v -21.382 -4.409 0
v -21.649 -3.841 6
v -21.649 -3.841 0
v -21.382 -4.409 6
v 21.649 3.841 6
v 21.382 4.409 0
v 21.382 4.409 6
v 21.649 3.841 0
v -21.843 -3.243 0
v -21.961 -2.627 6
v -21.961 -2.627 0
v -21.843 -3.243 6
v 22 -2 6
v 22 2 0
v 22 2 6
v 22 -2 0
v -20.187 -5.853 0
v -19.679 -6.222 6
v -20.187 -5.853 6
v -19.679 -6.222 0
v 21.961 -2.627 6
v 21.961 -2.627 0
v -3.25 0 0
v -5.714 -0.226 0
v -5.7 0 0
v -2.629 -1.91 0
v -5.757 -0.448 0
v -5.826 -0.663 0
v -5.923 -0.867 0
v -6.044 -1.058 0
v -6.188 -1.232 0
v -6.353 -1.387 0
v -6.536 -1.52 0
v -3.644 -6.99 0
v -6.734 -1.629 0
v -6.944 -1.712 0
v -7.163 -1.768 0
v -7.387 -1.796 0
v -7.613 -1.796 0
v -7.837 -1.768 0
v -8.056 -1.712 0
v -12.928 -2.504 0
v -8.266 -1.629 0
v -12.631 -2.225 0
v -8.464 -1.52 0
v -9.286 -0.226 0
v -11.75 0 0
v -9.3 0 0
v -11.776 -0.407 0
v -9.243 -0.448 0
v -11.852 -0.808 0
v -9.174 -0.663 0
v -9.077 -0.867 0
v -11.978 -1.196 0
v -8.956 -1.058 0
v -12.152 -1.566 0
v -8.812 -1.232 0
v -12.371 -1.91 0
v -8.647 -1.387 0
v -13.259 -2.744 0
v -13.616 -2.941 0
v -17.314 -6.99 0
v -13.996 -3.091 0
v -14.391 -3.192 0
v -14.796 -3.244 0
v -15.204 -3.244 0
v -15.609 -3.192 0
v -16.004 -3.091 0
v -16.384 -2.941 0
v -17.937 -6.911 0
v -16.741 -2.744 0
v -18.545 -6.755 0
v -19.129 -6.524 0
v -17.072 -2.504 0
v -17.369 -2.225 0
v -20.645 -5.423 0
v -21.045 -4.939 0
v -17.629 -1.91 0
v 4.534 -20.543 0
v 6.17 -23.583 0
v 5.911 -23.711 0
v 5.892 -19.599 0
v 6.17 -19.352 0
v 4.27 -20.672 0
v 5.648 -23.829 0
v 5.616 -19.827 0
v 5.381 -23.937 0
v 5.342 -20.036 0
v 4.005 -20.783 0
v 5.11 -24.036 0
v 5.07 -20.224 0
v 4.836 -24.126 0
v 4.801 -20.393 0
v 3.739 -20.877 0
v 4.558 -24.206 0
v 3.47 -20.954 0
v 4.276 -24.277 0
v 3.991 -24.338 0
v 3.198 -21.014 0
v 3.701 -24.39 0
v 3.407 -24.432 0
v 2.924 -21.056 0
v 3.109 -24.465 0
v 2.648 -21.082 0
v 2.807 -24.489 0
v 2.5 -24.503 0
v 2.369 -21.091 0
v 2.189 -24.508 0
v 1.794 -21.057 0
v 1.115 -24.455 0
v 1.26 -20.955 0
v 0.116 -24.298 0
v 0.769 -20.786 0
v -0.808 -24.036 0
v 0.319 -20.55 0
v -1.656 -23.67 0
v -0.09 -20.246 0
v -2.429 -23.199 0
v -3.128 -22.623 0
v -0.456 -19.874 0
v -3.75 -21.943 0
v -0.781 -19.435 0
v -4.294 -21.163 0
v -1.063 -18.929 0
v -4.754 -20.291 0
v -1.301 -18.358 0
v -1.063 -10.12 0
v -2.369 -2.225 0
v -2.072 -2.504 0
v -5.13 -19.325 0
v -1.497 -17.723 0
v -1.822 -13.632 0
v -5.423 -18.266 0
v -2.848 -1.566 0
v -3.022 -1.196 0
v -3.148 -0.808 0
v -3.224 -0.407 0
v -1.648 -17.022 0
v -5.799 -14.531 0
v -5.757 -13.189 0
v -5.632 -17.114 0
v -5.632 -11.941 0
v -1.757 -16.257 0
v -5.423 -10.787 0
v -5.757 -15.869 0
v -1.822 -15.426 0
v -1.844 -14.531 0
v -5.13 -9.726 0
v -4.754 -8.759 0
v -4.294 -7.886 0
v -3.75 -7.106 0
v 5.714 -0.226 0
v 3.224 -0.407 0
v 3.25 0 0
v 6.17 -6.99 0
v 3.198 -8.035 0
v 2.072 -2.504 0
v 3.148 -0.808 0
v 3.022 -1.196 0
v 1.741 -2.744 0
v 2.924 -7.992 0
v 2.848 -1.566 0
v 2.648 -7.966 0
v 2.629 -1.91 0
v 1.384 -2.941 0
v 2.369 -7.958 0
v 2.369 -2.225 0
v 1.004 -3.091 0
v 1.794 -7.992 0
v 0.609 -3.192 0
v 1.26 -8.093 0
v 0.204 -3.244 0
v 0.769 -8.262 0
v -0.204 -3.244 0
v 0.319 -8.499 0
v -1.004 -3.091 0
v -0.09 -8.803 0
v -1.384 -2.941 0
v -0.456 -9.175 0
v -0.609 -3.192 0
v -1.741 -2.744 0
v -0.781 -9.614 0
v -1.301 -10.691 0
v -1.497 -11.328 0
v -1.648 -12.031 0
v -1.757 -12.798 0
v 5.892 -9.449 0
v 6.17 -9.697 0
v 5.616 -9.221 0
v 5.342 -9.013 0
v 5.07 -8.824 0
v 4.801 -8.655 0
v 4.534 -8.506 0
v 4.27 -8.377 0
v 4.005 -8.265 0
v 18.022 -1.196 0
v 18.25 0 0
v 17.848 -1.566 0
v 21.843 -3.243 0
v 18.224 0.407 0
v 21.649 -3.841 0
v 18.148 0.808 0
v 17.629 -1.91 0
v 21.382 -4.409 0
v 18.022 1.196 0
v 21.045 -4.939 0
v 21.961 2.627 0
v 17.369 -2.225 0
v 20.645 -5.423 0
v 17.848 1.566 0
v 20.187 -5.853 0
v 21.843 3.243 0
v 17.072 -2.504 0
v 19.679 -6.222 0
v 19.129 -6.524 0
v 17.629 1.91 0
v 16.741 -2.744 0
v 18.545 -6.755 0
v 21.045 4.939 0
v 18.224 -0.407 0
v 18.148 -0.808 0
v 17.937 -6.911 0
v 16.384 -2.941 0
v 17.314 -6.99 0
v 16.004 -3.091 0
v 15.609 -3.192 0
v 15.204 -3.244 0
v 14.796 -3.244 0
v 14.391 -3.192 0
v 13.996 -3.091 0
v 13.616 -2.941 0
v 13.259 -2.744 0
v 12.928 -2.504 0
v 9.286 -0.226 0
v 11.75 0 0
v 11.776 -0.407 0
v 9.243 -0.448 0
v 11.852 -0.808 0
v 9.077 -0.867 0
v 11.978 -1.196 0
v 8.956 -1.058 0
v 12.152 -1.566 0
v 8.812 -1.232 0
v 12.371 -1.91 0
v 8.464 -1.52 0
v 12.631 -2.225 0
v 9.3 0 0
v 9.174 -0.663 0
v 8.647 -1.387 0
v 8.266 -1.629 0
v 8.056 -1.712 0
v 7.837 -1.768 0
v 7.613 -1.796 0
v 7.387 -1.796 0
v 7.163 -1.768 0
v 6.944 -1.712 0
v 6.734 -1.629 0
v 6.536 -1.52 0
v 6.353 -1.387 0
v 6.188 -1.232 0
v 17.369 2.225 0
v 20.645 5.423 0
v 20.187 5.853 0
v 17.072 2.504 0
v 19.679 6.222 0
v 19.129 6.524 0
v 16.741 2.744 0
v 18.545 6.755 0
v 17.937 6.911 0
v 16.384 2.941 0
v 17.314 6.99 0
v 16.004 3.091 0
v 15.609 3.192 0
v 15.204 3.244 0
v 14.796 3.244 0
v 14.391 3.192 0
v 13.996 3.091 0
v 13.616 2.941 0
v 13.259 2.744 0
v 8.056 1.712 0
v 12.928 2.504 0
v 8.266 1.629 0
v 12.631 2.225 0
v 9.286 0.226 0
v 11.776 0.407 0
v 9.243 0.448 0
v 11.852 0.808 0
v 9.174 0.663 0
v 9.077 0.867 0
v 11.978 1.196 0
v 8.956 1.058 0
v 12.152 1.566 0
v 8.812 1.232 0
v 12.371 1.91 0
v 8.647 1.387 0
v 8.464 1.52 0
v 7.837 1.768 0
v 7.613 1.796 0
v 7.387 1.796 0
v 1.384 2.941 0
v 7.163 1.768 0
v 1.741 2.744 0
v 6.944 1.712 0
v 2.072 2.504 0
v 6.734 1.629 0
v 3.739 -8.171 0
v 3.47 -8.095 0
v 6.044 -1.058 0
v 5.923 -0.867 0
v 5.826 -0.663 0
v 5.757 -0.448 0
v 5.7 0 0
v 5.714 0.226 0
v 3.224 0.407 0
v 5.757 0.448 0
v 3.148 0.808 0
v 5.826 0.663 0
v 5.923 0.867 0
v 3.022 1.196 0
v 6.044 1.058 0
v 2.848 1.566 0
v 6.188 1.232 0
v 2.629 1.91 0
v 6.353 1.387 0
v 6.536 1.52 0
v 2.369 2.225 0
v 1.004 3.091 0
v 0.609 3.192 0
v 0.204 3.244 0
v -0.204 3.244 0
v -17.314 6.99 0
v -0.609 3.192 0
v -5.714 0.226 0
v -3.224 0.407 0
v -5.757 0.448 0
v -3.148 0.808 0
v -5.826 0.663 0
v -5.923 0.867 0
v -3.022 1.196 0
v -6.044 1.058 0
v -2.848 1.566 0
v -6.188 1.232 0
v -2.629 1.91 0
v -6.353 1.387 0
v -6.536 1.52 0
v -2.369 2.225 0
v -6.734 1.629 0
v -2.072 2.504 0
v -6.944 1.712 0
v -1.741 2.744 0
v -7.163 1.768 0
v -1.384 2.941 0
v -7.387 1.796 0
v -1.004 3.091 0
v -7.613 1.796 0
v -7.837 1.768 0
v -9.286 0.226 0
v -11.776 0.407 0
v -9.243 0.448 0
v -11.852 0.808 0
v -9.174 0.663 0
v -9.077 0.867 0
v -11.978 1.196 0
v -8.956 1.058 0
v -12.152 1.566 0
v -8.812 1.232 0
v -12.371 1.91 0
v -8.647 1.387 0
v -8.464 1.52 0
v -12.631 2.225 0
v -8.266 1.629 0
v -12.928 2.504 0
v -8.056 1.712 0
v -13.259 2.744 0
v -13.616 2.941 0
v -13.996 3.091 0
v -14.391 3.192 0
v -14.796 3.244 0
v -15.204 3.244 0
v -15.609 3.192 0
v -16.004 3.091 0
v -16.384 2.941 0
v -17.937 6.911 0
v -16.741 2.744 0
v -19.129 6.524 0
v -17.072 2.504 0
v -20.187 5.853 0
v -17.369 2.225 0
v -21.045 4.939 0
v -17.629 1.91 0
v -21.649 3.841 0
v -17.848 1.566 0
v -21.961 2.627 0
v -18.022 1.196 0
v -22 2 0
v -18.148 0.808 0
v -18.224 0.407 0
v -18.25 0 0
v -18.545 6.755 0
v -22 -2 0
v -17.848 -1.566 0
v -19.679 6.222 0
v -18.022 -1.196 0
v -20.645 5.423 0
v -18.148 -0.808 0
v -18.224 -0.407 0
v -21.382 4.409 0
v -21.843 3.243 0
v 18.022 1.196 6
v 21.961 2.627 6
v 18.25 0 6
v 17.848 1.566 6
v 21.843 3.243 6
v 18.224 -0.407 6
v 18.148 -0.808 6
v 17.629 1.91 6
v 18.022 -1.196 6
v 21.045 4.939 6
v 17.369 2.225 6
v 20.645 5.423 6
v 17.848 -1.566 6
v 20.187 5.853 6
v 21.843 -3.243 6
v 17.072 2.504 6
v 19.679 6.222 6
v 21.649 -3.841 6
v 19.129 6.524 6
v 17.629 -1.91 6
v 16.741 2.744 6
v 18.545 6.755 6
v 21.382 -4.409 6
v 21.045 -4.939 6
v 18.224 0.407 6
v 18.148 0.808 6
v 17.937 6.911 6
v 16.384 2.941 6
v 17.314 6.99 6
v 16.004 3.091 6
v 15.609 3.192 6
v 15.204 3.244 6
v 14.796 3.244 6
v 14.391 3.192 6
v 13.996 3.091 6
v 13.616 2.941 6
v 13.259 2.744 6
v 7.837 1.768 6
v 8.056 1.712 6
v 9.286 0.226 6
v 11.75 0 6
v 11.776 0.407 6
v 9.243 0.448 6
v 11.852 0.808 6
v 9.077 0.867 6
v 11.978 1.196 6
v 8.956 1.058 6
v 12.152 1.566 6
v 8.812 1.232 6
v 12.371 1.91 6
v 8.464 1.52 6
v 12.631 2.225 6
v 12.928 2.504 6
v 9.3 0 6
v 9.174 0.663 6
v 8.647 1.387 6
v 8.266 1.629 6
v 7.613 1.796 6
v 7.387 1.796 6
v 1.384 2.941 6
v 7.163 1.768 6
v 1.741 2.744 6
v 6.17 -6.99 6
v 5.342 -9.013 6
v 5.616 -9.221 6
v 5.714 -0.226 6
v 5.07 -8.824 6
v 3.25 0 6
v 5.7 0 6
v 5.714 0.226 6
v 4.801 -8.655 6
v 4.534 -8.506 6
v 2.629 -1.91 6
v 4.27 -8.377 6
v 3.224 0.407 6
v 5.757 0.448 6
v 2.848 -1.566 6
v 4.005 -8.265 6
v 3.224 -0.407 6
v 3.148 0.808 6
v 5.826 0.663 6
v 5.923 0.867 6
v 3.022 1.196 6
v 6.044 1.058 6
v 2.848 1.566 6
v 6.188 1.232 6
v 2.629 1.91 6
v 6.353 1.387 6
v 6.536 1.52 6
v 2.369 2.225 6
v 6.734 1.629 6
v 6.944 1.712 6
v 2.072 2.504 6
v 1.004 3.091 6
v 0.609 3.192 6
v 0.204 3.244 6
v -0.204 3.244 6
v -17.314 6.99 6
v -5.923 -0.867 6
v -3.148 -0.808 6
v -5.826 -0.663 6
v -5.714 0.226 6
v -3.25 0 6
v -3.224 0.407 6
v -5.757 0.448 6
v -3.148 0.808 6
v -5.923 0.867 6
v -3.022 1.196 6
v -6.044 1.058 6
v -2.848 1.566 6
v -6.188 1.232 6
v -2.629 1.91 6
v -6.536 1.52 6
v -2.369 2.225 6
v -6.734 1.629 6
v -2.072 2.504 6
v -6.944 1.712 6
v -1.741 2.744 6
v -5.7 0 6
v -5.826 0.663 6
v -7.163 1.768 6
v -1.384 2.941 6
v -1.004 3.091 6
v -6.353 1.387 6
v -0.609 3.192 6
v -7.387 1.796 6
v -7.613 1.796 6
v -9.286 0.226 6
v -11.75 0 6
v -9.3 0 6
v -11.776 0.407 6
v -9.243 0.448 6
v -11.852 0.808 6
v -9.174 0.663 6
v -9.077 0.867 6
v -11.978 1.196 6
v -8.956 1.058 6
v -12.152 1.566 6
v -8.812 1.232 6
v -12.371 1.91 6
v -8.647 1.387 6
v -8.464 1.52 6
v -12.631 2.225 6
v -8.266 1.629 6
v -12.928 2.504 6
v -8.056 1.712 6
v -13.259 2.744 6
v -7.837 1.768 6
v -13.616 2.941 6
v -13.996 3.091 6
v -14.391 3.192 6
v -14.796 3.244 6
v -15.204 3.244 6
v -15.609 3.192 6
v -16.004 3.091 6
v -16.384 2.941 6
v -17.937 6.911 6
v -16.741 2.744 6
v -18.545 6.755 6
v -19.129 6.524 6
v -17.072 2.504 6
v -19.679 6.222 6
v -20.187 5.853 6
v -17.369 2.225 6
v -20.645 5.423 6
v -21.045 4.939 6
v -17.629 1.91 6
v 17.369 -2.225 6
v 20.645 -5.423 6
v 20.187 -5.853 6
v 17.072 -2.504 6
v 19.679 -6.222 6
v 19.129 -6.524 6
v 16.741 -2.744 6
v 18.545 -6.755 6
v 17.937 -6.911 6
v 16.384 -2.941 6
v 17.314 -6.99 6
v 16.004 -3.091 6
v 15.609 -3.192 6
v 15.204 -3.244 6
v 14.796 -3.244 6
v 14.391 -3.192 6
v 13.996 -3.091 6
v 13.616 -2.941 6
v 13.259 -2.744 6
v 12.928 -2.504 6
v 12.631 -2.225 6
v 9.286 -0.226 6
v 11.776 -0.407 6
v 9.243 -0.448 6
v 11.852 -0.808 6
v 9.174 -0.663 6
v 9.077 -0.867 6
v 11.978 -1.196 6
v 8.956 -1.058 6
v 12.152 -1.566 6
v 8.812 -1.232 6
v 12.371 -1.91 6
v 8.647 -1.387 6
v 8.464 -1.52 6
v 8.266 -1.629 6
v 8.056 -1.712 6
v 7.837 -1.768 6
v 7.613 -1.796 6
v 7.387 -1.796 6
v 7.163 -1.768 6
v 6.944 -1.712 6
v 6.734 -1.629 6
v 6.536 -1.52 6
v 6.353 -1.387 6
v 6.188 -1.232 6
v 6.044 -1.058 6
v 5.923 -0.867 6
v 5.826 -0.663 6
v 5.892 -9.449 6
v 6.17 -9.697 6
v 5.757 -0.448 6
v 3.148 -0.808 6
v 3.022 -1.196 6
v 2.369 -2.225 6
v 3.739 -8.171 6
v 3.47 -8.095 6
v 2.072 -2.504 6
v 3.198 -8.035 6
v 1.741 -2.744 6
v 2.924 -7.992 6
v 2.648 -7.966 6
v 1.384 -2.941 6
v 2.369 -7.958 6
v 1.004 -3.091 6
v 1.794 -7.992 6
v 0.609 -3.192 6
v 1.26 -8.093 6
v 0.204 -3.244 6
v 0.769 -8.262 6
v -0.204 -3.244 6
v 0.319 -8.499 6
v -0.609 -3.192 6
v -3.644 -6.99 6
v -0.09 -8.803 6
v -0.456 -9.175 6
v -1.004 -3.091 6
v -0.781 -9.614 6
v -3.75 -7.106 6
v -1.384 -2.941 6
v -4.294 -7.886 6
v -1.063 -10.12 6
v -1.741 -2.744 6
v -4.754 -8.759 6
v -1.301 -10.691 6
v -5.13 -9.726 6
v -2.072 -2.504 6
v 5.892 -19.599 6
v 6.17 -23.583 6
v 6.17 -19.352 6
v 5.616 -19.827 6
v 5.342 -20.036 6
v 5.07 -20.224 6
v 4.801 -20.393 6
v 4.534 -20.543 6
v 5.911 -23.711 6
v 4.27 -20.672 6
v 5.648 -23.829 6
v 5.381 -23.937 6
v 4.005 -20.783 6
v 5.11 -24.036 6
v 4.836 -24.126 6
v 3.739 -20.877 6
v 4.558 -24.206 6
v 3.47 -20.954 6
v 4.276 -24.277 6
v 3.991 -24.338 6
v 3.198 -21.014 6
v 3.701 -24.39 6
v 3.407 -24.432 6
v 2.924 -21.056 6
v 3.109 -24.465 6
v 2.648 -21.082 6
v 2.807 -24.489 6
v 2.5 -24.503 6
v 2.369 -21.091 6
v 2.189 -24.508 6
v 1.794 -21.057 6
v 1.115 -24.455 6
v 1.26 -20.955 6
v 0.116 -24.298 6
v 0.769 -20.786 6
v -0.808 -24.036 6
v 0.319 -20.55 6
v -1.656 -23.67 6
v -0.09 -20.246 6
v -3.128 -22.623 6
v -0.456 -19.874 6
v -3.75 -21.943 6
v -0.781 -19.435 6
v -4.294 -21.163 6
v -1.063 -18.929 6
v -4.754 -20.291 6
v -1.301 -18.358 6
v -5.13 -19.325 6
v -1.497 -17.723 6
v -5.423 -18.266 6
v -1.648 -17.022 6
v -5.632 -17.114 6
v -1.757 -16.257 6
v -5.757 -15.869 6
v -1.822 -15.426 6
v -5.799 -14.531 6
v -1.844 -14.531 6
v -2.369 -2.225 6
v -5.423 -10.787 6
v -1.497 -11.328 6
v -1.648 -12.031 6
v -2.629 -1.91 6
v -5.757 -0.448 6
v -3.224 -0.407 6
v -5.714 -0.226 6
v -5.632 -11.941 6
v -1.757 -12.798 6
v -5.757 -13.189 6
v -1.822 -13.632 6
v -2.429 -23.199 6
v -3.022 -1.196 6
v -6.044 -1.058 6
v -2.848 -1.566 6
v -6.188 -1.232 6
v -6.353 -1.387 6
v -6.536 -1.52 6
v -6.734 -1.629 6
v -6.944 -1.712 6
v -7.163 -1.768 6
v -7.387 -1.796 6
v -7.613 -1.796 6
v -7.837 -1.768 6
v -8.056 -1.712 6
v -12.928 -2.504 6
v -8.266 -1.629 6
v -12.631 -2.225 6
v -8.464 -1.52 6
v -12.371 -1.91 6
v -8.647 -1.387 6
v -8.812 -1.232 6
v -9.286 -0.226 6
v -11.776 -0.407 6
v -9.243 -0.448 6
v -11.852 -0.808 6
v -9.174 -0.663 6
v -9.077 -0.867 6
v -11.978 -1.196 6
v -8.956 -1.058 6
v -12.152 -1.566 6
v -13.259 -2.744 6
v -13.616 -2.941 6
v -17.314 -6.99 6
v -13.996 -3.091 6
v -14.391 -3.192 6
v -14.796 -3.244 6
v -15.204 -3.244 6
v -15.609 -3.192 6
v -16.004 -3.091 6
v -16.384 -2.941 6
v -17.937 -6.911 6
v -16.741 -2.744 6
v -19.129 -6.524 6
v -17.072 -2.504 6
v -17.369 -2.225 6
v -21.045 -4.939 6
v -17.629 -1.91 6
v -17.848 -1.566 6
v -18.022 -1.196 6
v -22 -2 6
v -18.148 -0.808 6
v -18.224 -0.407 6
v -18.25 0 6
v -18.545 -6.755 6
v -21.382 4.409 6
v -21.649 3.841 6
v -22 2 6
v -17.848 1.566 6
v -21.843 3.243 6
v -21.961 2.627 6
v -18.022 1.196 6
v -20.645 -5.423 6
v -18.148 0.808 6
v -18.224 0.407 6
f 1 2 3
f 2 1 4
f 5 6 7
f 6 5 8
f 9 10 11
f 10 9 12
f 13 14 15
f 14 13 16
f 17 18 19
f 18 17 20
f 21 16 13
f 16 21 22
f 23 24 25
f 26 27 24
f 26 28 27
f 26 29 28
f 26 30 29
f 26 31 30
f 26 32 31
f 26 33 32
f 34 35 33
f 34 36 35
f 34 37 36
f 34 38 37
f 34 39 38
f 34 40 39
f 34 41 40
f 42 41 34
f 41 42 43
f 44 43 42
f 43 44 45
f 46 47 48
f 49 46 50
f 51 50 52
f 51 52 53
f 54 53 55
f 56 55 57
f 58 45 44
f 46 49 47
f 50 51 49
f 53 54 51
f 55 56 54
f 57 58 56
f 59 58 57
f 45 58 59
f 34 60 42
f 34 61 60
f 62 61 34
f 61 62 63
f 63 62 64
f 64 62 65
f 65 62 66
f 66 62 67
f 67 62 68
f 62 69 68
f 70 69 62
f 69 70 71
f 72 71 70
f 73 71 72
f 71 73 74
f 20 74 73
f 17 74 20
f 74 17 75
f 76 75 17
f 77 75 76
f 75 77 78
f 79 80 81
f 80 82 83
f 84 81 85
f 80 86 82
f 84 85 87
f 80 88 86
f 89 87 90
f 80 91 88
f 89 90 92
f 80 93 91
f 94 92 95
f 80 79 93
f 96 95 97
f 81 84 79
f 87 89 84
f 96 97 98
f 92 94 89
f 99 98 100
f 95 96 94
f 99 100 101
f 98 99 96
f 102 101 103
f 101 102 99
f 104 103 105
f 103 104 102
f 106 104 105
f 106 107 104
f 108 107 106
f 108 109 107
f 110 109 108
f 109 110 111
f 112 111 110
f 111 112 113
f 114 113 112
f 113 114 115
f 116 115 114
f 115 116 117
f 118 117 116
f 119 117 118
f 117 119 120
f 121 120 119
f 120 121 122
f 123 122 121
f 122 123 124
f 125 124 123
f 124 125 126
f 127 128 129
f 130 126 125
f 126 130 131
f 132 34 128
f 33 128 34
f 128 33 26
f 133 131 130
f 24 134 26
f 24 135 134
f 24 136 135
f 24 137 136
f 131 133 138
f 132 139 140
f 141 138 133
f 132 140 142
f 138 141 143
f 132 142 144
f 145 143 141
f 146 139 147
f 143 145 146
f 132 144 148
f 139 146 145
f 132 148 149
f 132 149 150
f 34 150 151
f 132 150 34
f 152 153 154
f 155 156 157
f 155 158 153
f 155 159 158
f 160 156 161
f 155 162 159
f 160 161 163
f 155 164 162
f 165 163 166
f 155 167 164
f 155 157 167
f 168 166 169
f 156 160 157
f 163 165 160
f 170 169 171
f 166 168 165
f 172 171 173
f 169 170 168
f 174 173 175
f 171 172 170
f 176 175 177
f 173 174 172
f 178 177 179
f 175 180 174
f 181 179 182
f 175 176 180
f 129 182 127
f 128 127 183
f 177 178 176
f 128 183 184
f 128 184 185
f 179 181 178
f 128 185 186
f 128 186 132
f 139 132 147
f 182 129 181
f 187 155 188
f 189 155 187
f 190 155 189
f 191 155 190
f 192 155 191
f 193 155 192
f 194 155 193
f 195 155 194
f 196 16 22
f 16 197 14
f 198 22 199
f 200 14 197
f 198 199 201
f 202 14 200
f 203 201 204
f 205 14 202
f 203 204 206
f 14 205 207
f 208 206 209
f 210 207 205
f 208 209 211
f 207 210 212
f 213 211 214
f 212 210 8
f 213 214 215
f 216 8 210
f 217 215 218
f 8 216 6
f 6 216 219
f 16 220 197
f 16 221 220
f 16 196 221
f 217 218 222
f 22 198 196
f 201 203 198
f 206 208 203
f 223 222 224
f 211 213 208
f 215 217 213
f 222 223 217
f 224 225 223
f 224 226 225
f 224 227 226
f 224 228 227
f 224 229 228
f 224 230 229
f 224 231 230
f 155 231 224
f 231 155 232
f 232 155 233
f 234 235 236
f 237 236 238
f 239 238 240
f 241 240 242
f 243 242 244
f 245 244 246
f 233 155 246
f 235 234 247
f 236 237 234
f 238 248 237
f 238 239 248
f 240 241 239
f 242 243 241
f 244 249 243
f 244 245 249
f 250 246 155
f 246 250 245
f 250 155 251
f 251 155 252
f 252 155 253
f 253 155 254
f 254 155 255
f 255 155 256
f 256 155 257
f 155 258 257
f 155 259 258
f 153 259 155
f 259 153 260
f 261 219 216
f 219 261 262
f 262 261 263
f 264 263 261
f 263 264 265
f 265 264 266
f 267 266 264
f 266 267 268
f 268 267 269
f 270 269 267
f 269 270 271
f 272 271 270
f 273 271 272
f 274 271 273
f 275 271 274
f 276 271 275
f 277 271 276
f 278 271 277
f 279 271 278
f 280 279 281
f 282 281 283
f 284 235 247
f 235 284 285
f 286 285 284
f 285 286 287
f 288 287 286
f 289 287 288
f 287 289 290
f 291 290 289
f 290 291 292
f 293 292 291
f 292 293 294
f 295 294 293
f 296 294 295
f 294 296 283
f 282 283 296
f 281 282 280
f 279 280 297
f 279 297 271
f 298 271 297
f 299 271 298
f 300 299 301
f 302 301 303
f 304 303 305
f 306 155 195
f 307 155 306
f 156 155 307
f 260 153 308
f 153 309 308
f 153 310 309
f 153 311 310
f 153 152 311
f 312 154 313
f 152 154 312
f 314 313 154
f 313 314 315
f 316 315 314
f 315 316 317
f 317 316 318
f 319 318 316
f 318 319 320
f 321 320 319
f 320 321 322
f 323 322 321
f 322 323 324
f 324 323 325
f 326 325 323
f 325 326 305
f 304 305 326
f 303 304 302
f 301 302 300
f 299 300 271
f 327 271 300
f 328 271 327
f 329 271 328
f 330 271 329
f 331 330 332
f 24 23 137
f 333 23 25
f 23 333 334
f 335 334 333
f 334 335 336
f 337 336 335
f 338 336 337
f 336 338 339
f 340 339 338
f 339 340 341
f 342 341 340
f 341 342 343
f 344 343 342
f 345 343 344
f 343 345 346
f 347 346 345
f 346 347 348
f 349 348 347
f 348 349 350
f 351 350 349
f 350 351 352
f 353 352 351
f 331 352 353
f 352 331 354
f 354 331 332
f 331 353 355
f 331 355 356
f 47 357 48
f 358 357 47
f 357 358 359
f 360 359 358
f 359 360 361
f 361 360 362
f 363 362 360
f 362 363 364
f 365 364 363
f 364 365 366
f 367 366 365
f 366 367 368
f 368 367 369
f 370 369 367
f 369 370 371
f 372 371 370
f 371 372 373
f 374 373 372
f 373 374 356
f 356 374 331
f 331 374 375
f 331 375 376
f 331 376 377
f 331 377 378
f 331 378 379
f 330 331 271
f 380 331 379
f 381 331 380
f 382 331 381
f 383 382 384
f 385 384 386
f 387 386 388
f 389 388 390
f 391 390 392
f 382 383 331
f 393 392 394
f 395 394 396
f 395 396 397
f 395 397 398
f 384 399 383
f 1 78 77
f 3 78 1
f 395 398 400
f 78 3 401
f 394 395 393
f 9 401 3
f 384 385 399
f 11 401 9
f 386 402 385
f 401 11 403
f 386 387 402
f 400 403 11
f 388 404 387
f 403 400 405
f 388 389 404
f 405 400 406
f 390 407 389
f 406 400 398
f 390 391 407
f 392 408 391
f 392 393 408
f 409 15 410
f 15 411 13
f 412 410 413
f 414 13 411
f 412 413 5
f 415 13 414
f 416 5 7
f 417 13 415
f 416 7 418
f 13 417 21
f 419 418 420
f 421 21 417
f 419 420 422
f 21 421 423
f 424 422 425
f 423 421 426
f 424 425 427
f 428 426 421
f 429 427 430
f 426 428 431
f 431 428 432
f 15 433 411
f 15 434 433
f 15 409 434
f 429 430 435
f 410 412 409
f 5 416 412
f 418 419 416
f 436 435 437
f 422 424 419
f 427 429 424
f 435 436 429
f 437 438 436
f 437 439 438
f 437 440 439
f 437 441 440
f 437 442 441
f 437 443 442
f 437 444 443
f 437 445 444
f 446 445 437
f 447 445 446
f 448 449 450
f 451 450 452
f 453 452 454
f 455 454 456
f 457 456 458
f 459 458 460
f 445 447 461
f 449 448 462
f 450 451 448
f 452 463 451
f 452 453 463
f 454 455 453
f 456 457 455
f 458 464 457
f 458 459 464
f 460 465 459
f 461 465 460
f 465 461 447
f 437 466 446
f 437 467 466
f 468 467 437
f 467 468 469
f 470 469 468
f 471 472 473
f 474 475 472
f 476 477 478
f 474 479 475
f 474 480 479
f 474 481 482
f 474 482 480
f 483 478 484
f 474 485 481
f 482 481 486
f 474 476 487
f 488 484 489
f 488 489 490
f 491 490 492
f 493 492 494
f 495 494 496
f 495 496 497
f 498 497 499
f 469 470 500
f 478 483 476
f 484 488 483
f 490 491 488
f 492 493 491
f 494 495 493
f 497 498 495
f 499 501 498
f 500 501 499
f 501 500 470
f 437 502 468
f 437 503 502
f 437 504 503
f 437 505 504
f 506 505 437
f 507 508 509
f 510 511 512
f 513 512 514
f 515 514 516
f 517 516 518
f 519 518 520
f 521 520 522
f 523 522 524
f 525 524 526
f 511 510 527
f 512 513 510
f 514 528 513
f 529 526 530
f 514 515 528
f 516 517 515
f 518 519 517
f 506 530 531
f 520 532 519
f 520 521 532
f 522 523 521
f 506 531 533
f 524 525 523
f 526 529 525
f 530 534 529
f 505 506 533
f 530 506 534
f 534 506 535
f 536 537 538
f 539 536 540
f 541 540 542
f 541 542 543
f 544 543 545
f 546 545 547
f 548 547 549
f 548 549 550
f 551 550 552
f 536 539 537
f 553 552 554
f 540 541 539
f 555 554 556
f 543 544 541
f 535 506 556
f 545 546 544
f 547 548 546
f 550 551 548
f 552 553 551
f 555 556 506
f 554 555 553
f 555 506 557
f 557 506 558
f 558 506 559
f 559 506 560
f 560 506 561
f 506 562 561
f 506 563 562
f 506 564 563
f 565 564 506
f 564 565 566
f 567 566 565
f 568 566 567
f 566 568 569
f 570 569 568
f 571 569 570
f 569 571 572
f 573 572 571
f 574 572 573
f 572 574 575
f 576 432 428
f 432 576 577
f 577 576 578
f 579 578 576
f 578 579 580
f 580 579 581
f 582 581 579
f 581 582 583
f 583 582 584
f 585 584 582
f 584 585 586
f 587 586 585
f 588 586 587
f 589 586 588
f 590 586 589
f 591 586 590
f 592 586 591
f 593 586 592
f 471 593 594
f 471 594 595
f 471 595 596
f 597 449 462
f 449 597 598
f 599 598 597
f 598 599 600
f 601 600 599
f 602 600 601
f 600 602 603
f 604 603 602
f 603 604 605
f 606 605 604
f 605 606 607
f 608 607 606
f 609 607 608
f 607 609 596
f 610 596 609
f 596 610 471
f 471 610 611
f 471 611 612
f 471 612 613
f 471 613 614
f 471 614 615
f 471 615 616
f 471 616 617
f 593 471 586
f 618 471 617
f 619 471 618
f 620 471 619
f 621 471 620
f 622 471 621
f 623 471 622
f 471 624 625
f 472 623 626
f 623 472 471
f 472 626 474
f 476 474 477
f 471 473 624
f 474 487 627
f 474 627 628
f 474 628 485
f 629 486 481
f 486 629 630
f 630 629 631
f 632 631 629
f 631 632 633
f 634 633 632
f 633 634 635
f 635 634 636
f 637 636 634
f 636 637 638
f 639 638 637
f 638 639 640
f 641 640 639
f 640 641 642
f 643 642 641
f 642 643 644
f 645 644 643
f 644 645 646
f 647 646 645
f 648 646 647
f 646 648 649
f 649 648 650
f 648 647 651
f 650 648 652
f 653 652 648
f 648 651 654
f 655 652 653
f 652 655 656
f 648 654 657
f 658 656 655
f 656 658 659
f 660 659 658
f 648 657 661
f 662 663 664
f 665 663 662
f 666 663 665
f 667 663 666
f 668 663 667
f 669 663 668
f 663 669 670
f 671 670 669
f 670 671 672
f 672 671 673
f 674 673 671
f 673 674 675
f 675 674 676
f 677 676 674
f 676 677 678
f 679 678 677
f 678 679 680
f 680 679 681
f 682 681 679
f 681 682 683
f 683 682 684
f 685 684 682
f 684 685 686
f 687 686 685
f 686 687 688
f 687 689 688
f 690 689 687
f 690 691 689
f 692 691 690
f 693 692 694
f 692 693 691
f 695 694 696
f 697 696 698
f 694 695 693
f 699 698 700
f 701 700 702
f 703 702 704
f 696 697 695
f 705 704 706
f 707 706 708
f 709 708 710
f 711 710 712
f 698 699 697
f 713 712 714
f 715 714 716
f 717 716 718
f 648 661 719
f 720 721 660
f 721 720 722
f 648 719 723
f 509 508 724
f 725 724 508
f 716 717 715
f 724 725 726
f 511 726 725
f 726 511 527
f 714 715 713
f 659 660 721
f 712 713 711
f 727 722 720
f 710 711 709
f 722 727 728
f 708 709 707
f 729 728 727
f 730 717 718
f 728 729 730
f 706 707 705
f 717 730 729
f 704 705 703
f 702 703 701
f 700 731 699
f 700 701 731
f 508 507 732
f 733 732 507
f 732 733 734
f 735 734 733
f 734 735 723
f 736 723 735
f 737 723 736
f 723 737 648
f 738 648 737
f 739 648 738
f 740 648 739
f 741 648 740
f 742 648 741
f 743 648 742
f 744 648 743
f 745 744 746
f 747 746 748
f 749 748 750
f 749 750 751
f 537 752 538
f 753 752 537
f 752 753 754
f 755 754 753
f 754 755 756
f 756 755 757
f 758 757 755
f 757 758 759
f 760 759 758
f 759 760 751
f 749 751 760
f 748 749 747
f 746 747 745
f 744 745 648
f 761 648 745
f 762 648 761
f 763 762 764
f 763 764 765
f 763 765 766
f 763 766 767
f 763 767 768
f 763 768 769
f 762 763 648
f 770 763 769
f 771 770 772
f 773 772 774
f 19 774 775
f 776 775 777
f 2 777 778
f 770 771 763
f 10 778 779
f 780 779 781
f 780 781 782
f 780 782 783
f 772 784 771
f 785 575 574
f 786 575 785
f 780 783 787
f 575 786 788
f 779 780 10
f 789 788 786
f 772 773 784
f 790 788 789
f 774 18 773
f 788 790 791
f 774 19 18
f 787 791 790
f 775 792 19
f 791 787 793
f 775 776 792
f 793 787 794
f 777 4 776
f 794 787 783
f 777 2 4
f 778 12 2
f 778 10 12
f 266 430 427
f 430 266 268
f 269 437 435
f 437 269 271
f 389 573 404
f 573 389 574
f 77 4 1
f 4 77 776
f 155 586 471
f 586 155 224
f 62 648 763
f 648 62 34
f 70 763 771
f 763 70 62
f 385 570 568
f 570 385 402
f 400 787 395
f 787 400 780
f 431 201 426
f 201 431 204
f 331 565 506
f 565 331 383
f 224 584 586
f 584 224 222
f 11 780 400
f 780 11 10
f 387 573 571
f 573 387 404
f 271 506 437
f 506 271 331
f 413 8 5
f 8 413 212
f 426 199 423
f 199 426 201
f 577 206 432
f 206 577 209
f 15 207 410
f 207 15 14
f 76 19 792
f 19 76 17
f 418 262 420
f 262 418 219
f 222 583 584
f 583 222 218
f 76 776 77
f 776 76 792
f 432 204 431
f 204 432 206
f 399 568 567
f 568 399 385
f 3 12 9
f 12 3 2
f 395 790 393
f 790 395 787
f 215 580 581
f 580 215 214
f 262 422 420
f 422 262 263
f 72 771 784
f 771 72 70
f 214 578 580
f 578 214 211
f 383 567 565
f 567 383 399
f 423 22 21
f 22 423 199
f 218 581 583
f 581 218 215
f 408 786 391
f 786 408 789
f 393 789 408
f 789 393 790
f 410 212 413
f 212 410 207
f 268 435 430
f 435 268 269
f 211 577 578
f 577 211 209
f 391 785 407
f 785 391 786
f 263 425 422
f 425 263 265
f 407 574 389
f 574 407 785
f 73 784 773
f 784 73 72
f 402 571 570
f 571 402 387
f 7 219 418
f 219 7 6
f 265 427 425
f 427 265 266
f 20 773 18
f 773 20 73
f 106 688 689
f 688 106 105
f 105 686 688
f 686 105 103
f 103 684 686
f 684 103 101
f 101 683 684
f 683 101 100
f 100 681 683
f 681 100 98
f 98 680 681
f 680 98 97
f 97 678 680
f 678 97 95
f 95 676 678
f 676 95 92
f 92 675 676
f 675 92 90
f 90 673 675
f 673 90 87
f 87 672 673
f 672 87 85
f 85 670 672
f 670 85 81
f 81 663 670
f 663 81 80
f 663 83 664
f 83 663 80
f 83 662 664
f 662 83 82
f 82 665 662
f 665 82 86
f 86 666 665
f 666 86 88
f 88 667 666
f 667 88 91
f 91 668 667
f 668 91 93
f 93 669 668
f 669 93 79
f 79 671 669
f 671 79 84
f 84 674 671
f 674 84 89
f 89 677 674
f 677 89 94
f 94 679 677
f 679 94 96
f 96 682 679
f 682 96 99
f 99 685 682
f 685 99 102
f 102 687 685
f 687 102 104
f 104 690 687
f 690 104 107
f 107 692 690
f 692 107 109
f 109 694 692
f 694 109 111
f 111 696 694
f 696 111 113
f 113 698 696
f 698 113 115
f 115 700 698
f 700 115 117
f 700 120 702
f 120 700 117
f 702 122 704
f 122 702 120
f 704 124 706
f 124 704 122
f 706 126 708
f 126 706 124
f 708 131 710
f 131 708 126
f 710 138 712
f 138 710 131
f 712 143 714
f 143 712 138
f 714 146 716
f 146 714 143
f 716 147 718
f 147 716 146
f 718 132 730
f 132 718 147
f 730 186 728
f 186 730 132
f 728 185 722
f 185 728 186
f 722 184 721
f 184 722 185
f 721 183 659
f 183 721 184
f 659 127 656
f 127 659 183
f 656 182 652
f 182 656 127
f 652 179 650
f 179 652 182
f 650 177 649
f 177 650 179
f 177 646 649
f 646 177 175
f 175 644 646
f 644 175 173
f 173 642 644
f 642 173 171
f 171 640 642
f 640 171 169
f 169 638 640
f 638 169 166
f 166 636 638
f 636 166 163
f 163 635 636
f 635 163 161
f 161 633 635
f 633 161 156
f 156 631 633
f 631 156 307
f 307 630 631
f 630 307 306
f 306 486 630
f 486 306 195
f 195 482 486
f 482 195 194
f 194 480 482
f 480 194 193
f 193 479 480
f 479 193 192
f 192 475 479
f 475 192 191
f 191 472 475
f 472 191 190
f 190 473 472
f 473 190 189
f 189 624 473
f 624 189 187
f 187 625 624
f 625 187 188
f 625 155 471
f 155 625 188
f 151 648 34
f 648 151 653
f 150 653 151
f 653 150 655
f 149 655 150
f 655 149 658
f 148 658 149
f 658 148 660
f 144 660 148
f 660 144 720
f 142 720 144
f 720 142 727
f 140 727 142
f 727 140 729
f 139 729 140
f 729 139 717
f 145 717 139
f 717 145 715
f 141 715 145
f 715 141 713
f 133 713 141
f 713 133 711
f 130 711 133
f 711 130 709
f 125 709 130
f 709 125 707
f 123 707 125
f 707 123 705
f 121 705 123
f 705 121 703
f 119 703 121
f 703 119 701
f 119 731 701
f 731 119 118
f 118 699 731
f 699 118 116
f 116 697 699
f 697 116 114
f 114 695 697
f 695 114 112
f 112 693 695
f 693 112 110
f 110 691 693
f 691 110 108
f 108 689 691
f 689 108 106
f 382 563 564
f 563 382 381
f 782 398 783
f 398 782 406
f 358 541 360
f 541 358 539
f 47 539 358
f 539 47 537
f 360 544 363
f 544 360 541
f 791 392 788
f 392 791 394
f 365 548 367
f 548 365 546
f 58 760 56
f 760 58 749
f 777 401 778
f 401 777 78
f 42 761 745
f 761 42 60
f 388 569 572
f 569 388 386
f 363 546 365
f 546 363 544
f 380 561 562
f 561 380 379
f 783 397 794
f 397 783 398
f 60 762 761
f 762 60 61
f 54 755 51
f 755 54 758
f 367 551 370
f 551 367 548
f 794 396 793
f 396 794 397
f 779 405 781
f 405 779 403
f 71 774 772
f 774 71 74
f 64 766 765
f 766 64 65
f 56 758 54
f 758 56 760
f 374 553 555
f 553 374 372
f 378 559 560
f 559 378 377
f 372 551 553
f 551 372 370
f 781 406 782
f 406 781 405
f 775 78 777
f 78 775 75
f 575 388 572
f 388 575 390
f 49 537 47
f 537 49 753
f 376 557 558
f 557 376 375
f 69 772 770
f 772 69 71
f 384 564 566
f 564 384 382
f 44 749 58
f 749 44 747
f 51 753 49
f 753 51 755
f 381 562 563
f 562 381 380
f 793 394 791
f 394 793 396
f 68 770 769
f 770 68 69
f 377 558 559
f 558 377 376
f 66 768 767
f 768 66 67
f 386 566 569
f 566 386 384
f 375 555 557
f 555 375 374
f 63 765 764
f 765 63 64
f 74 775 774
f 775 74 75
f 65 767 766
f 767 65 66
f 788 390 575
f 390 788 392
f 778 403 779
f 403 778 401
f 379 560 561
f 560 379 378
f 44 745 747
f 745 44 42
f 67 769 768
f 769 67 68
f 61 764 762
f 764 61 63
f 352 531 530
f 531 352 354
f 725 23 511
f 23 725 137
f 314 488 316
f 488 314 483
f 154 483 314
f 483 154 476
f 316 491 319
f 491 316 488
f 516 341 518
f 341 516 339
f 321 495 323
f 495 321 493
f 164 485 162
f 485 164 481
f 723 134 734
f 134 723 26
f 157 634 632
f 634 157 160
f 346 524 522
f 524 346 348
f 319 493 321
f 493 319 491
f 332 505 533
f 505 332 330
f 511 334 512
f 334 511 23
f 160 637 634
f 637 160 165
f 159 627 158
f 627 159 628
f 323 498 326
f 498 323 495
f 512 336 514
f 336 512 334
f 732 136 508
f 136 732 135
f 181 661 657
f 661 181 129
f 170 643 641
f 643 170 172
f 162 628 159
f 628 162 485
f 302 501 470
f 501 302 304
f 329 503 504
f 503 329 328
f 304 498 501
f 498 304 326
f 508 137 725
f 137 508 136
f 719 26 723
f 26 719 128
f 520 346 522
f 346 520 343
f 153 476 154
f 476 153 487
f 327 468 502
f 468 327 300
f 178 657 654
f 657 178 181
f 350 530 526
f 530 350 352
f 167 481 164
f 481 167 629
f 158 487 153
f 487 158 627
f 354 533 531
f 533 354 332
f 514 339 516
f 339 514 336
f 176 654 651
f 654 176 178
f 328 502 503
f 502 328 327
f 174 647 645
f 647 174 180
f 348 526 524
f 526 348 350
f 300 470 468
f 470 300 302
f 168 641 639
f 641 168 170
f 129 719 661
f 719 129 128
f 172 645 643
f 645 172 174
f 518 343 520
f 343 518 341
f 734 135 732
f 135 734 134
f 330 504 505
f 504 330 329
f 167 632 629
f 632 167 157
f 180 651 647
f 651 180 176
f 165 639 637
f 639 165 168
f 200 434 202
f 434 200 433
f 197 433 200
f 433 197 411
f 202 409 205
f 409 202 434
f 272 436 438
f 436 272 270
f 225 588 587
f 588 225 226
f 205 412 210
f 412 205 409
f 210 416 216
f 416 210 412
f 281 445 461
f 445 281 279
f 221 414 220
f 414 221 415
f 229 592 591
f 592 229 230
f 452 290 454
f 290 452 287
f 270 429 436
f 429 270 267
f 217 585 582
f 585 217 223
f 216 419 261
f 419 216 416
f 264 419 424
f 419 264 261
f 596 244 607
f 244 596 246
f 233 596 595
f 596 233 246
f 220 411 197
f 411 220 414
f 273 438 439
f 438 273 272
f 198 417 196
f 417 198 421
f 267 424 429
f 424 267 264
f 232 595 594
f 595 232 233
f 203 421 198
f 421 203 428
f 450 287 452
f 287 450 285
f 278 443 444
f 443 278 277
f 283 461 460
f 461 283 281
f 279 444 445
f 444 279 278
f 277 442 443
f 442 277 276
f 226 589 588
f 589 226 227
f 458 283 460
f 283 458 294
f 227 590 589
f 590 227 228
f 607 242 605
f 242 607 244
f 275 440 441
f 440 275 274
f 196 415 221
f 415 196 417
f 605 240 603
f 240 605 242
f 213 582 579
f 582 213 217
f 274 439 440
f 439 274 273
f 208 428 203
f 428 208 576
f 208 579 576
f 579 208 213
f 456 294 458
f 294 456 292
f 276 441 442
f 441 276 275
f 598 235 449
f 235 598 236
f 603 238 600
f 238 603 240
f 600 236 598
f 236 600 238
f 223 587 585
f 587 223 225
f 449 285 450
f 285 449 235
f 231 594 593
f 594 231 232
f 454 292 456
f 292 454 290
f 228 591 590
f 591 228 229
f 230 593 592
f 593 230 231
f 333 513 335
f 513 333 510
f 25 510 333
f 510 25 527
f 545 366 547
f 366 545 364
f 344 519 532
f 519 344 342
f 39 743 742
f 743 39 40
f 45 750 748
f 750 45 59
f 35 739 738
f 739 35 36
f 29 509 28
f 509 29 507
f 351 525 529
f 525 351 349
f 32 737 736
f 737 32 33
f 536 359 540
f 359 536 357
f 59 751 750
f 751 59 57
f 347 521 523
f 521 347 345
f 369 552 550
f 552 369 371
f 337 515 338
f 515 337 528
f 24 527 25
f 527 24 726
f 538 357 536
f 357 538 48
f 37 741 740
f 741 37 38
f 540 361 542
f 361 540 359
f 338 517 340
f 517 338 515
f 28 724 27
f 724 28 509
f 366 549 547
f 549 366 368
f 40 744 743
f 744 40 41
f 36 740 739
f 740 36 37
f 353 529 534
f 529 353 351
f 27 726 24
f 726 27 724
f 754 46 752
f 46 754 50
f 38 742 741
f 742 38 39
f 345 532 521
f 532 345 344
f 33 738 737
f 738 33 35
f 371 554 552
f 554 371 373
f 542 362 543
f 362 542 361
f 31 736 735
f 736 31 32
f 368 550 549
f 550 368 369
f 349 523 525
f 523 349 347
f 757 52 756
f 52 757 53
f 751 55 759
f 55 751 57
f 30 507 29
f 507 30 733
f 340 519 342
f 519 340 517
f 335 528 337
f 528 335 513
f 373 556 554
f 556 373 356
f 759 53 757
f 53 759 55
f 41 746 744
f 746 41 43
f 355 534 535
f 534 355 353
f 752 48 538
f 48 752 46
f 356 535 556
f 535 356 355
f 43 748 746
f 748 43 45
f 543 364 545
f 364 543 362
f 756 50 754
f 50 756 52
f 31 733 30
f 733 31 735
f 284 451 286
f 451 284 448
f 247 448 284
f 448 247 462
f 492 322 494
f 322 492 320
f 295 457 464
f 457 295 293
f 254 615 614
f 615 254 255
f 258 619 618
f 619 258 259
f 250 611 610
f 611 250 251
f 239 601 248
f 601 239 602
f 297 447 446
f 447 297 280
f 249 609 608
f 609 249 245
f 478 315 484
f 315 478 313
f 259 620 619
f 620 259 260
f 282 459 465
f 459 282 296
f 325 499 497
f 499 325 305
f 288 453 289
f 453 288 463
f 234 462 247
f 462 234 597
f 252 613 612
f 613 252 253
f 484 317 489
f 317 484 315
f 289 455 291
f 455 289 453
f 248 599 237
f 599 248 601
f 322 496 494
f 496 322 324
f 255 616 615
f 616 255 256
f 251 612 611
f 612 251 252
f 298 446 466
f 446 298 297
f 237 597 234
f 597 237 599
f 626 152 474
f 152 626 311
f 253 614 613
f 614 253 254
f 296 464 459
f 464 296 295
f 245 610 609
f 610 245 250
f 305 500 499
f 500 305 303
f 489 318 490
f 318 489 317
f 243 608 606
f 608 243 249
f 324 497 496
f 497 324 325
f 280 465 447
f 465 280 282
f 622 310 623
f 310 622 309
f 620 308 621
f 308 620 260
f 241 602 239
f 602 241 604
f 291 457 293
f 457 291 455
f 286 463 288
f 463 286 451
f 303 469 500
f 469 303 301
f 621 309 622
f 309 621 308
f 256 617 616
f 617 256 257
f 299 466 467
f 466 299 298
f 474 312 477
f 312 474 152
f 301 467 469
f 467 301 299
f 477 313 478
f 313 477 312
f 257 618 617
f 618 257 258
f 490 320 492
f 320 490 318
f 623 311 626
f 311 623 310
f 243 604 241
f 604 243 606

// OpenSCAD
$fn = 50;


difference() {
	union() {
		hull() {
			translate(v = [-17.0000000000, 2.0000000000, 0]) {
				cylinder(h = 6, r = 5);
			}
			translate(v = [17.0000000000, 2.0000000000, 0]) {
				cylinder(h = 6, r = 5);
			}
			translate(v = [-17.0000000000, -2.0000000000, 0]) {
				cylinder(h = 6, r = 5);
			}
			translate(v = [17.0000000000, -2.0000000000, 0]) {
				cylinder(h = 6, r = 5);
			}
		}
		translate(v = [0, -5, 0]) {
			linear_extrude(height = 6) {
				text(font = "DejaVu Sans Mono:style=Bold", halign = "center", size = 19.0000000000, text = "C", valign = "top");
			}
		}
	}
	union() {
		translate(v = [-15.0000000000, 0.0000000000, 0]) {
			translate(v = [0, 0, -100]) {
				cylinder(h = 200, r = 3.2500000000);
			}
		}
		translate(v = [0, 0, -100]) {
			cylinder(h = 200, r = 3.2500000000);
		}
		translate(v = [15.0000000000, 0.0000000000, 0]) {
			translate(v = [0, 0, -100]) {
				cylinder(h = 200, r = 3.2500000000);
			}
		}
		translate(v = [-15.0000000000, 0.0000000000, 0]) {
			translate(v = [0, 0, -100]) {
				cylinder(h = 200, r = 1.8000000000);
			}
		}
		translate(v = [-7.5000000000, 0.0000000000, 0]) {
			translate(v = [0, 0, -100]) {
				cylinder(h = 200, r = 1.8000000000);
			}
		}
		translate(v = [0, 0, -100]) {
			cylinder(h = 200, r = 1.8000000000);
		}
		translate(v = [7.5000000000, 0.0000000000, 0]) {
			translate(v = [0, 0, -100]) {
				cylinder(h = 200, r = 1.8000000000);
			}
		}
		translate(v = [15.0000000000, 0.0000000000, 0]) {
			translate(v = [0, 0, -100]) {
				cylinder(h = 200, r = 1.8000000000);
			}
		}
	}
}
